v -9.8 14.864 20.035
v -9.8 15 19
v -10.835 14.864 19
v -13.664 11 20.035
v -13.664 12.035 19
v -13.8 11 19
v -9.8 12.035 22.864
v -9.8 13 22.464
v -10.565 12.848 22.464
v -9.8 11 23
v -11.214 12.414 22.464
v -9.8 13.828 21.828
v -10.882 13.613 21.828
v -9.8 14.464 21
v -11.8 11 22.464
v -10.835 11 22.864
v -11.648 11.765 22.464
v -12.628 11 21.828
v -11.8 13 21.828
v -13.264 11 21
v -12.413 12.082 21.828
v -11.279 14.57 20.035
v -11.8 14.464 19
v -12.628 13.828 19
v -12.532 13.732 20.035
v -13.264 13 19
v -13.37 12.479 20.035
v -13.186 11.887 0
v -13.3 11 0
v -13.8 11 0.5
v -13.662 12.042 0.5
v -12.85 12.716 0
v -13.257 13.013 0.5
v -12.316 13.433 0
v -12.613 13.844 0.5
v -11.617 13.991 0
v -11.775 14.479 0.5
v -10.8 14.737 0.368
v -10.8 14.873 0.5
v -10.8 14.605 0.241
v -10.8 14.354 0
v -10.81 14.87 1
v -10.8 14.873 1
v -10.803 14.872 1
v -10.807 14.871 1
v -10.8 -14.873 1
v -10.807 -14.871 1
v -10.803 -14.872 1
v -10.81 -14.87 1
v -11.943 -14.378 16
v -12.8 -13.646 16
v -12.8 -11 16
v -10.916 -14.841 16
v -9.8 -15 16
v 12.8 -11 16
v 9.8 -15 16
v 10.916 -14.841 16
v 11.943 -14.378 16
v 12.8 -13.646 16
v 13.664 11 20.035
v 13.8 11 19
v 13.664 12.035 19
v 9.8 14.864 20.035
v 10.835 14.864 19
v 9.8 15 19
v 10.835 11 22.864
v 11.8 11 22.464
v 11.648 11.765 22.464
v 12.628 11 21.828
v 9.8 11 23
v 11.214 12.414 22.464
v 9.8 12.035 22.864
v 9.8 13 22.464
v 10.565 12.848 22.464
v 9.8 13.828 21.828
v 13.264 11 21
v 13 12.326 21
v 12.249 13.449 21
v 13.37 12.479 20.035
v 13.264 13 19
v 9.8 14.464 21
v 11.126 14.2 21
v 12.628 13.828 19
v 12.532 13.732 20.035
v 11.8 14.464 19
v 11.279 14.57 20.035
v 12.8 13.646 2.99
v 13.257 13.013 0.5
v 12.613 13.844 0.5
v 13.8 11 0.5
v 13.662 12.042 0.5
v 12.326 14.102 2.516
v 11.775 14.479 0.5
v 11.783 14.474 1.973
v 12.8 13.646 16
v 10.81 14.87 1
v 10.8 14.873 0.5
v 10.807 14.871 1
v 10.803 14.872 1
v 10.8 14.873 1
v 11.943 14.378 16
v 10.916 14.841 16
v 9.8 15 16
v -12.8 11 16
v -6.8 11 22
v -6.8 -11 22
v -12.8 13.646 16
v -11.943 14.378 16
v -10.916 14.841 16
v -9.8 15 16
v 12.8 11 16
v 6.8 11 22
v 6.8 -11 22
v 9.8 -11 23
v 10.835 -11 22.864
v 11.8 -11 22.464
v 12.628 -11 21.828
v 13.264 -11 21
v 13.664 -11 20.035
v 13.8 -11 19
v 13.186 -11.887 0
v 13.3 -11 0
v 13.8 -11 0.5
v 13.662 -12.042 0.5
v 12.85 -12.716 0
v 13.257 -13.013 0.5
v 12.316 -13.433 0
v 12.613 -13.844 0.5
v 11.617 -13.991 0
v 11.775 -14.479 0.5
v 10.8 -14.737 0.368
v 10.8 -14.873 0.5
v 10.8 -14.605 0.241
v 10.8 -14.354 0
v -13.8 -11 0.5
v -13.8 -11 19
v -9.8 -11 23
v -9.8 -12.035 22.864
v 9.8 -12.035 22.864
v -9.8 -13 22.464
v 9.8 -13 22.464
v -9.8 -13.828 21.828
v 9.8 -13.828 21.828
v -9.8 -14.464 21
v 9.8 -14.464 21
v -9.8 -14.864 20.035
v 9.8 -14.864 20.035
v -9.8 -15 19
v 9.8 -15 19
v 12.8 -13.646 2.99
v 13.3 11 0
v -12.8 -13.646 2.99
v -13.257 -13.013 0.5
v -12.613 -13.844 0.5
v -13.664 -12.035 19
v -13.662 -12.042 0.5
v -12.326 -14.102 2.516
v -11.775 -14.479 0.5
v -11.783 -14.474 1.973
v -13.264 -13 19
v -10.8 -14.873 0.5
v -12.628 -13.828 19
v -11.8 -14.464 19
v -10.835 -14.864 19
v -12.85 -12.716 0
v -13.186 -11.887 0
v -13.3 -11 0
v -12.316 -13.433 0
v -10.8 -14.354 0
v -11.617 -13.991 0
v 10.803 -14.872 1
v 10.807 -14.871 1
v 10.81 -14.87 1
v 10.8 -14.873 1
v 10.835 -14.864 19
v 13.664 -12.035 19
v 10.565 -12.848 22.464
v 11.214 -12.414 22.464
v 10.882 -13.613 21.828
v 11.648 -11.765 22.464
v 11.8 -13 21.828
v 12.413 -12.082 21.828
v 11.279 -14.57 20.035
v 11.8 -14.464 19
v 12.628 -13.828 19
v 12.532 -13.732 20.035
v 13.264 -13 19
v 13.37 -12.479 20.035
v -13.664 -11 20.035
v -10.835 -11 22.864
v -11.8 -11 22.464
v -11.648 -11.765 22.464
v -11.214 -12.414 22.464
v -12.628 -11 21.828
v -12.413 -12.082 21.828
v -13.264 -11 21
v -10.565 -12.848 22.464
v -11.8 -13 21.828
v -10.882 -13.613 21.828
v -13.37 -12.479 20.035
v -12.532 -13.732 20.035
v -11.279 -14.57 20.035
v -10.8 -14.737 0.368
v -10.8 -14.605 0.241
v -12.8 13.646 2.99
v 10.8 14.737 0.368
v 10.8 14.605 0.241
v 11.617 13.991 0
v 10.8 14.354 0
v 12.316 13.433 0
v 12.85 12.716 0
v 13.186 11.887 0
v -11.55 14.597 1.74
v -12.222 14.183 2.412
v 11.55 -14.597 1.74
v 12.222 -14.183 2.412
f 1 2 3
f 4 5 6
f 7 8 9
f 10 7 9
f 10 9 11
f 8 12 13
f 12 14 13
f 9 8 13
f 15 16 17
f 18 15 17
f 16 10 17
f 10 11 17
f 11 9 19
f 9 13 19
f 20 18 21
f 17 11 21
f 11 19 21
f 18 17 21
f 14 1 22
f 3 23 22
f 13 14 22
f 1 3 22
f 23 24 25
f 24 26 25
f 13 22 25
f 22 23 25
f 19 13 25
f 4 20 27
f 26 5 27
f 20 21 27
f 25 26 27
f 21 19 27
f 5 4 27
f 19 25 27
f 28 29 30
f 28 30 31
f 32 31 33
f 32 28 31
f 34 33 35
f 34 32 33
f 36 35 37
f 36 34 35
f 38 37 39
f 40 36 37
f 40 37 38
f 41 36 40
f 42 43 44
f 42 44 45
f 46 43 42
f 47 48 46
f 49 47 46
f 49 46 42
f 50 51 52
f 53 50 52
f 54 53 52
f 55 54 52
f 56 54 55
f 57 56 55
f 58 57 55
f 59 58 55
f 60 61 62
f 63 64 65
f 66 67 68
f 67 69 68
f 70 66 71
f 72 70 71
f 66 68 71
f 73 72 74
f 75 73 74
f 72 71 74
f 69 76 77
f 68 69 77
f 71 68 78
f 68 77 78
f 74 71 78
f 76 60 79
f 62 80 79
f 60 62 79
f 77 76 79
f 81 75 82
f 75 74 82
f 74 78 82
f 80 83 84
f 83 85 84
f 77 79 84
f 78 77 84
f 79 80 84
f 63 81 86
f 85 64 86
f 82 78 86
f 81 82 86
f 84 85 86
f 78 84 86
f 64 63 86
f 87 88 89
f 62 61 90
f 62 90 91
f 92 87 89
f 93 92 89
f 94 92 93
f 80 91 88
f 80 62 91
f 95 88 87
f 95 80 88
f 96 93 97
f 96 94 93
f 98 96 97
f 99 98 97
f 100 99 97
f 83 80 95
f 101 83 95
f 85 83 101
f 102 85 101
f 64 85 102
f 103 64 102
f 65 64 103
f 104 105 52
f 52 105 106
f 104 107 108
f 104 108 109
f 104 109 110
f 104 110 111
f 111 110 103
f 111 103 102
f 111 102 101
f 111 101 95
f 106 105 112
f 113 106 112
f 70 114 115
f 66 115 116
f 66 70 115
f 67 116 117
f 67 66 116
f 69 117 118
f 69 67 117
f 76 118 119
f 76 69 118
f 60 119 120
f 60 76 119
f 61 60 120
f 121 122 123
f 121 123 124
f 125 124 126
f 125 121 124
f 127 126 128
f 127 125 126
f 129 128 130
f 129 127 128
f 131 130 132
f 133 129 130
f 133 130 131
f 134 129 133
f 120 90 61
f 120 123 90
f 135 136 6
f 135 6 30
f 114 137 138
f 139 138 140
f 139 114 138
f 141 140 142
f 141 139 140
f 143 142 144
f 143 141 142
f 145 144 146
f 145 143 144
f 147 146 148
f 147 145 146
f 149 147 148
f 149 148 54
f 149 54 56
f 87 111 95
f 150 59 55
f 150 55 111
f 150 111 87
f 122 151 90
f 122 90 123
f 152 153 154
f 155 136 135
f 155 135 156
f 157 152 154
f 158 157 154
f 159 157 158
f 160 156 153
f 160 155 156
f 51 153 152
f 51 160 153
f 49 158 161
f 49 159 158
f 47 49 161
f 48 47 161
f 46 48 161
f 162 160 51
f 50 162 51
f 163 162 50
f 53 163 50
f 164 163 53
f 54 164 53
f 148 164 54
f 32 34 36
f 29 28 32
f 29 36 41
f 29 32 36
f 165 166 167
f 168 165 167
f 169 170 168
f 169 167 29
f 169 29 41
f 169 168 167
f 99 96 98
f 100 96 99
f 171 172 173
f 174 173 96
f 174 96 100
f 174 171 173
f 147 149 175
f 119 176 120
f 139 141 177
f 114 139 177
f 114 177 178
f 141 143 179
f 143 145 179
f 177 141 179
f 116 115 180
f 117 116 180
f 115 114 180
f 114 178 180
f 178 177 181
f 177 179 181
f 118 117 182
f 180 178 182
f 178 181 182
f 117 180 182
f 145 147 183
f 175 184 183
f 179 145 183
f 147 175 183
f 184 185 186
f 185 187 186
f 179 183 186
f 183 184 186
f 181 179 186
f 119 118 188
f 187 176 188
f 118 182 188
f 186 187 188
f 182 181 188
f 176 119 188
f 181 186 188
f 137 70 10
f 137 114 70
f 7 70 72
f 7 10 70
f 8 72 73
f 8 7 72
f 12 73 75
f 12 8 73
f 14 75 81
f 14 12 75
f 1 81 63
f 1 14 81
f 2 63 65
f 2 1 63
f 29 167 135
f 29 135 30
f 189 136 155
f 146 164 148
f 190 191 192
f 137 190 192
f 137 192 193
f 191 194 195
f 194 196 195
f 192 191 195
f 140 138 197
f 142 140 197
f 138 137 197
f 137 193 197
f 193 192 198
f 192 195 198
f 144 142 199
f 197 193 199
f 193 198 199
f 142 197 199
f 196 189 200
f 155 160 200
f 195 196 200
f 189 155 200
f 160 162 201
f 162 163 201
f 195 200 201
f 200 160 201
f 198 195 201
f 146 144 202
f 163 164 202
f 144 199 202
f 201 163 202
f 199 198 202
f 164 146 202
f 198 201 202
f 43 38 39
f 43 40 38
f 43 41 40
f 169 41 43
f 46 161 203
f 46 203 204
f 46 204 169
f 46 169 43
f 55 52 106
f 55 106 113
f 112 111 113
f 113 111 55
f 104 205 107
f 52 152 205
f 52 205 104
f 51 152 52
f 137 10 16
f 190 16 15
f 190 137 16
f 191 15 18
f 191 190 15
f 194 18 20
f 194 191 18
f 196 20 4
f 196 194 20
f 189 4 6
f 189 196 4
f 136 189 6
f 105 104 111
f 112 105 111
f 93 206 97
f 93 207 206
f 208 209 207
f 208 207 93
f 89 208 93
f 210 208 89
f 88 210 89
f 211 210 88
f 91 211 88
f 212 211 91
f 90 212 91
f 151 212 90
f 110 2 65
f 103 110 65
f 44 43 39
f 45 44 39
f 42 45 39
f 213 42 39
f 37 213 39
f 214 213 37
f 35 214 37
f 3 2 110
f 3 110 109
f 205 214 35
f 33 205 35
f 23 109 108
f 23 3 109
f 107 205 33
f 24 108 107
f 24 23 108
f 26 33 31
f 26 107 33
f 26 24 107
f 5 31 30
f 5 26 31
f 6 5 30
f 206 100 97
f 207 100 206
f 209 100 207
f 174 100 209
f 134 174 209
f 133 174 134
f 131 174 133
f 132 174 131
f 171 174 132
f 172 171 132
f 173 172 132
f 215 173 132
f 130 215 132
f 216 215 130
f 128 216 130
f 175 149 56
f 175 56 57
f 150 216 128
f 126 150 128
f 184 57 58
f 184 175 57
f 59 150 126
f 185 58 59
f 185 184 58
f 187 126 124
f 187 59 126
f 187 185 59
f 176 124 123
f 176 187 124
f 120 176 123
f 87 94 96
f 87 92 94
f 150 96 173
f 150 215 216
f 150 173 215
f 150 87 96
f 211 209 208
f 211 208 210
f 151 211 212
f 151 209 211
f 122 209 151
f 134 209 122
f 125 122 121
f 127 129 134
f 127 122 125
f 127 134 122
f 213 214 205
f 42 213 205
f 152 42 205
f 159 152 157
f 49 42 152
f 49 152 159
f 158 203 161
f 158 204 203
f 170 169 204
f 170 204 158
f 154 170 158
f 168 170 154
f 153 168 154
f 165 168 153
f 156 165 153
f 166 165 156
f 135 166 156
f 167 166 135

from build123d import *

# Parameters (mm, degrees)
PAD_DEPTH       = 15
CHAMFER_SIZE    = 1.99
CHAMFER001_SIZE = 6
SKETCH001_W     = 27.6
SKETCH001_H     = 7
PAD001_DEPTH    = 4
SKETCH002_W     = 31.6
SKETCH002_H     = 34
POCKET_DEPTH    = 23.001
FILLET_R        = 4
CHAMFER002_SIZE = 0.5


with BuildPart() as part:
    # Sketch → Pad (new body, symmetric)
    with BuildSketch(Plane.XZ):
        Polygon((-10.8, 0), (-10.8, 1), (-12.8, 1), (-12.8, 22), (12.8, 22), (12.8, 1), (10.8, 1), (10.8, 0), (13.8, 0), (13.8, 23), (-13.8, 23), (-13.8, 0), align=None)
    extrude(amount=PAD_DEPTH, both=True)

    # Chamfer
    chamfer_edges = [part.edges().sort_by_distance(p)[0] for p in [
        (-12.8, 0, 1),
        (12.8, 0, 1),
    ]]
    chamfer(chamfer_edges, length=CHAMFER_SIZE)

    # Chamfer001
    chamfer001_edges = [part.edges().sort_by_distance(p)[0] for p in [
        (12.8, 0, 22),
        (-12.8, 0, 22),
    ]]
    chamfer(chamfer001_edges, length=CHAMFER001_SIZE)

    # Sketch001 (on Face1 of Chamfer001) → Pad001 (join)
    with BuildSketch(Plane(origin=(0, 15, 0), x_dir=(1, 0, 0), z_dir=(0, 1, 0))):
        with Locations((0, -19.5)):
            Rectangle(SKETCH001_W, SKETCH001_H)
    pad001 = extrude(amount=-PAD001_DEPTH)

    # Mirrored: Pad001 across XZ
    add(pad001.mirror(Plane.XZ))

    # Sketch002 (on Face21 of Mirrored) → Pocket (cut, through all)
    with BuildSketch(Plane(origin=(0, 0, 23), x_dir=(-1, 0, 0), z_dir=(0, 0, 1))):
        Rectangle(SKETCH002_W, SKETCH002_H)
        with BuildLine():
            Line((-13.8, 11), (-13.8, -11))
            ThreePointArc((-13.8, -11), (-12.628427, -13.828427), (-9.8, -15))
            Line((-9.8, -15), (9.8, -15))
            ThreePointArc((9.8, -15), (12.628427, -13.828427), (13.8, -11))
            Line((13.8, -11), (13.8, 11))
            ThreePointArc((13.8, 11), (12.628427, 13.828427), (9.8, 15))
            Line((9.8, 15), (-9.8, 15))
            ThreePointArc((-9.8, 15), (-12.628427, 13.828427), (-13.8, 11))
        make_face(mode=Mode.SUBTRACT)
    extrude(amount=-POCKET_DEPTH, mode=Mode.SUBTRACT)

    # Fillet
    fillet_edges = [part.edges().sort_by_distance(p)[0] for p in [
        (0, 15, 23),
        (12.628427, 13.828427, 23),
        (13.8, 0, 23),
        (12.628427, -13.828427, 23),
        (0, -15, 23),
        (-12.628427, -13.828427, 23),
        (-13.8, 0, 23),
        (-12.628427, 13.828427, 23),
    ]]
    fillet(fillet_edges, radius=FILLET_R)

    # Chamfer002
    chamfer002_edges = [part.edges().sort_by_distance(p)[0] for p in [
        (13.8, 0, 0),
        (-13.8, 0, 0),
    ]]
    chamfer(chamfer002_edges, length=CHAMFER002_SIZE)


solid = part.part
